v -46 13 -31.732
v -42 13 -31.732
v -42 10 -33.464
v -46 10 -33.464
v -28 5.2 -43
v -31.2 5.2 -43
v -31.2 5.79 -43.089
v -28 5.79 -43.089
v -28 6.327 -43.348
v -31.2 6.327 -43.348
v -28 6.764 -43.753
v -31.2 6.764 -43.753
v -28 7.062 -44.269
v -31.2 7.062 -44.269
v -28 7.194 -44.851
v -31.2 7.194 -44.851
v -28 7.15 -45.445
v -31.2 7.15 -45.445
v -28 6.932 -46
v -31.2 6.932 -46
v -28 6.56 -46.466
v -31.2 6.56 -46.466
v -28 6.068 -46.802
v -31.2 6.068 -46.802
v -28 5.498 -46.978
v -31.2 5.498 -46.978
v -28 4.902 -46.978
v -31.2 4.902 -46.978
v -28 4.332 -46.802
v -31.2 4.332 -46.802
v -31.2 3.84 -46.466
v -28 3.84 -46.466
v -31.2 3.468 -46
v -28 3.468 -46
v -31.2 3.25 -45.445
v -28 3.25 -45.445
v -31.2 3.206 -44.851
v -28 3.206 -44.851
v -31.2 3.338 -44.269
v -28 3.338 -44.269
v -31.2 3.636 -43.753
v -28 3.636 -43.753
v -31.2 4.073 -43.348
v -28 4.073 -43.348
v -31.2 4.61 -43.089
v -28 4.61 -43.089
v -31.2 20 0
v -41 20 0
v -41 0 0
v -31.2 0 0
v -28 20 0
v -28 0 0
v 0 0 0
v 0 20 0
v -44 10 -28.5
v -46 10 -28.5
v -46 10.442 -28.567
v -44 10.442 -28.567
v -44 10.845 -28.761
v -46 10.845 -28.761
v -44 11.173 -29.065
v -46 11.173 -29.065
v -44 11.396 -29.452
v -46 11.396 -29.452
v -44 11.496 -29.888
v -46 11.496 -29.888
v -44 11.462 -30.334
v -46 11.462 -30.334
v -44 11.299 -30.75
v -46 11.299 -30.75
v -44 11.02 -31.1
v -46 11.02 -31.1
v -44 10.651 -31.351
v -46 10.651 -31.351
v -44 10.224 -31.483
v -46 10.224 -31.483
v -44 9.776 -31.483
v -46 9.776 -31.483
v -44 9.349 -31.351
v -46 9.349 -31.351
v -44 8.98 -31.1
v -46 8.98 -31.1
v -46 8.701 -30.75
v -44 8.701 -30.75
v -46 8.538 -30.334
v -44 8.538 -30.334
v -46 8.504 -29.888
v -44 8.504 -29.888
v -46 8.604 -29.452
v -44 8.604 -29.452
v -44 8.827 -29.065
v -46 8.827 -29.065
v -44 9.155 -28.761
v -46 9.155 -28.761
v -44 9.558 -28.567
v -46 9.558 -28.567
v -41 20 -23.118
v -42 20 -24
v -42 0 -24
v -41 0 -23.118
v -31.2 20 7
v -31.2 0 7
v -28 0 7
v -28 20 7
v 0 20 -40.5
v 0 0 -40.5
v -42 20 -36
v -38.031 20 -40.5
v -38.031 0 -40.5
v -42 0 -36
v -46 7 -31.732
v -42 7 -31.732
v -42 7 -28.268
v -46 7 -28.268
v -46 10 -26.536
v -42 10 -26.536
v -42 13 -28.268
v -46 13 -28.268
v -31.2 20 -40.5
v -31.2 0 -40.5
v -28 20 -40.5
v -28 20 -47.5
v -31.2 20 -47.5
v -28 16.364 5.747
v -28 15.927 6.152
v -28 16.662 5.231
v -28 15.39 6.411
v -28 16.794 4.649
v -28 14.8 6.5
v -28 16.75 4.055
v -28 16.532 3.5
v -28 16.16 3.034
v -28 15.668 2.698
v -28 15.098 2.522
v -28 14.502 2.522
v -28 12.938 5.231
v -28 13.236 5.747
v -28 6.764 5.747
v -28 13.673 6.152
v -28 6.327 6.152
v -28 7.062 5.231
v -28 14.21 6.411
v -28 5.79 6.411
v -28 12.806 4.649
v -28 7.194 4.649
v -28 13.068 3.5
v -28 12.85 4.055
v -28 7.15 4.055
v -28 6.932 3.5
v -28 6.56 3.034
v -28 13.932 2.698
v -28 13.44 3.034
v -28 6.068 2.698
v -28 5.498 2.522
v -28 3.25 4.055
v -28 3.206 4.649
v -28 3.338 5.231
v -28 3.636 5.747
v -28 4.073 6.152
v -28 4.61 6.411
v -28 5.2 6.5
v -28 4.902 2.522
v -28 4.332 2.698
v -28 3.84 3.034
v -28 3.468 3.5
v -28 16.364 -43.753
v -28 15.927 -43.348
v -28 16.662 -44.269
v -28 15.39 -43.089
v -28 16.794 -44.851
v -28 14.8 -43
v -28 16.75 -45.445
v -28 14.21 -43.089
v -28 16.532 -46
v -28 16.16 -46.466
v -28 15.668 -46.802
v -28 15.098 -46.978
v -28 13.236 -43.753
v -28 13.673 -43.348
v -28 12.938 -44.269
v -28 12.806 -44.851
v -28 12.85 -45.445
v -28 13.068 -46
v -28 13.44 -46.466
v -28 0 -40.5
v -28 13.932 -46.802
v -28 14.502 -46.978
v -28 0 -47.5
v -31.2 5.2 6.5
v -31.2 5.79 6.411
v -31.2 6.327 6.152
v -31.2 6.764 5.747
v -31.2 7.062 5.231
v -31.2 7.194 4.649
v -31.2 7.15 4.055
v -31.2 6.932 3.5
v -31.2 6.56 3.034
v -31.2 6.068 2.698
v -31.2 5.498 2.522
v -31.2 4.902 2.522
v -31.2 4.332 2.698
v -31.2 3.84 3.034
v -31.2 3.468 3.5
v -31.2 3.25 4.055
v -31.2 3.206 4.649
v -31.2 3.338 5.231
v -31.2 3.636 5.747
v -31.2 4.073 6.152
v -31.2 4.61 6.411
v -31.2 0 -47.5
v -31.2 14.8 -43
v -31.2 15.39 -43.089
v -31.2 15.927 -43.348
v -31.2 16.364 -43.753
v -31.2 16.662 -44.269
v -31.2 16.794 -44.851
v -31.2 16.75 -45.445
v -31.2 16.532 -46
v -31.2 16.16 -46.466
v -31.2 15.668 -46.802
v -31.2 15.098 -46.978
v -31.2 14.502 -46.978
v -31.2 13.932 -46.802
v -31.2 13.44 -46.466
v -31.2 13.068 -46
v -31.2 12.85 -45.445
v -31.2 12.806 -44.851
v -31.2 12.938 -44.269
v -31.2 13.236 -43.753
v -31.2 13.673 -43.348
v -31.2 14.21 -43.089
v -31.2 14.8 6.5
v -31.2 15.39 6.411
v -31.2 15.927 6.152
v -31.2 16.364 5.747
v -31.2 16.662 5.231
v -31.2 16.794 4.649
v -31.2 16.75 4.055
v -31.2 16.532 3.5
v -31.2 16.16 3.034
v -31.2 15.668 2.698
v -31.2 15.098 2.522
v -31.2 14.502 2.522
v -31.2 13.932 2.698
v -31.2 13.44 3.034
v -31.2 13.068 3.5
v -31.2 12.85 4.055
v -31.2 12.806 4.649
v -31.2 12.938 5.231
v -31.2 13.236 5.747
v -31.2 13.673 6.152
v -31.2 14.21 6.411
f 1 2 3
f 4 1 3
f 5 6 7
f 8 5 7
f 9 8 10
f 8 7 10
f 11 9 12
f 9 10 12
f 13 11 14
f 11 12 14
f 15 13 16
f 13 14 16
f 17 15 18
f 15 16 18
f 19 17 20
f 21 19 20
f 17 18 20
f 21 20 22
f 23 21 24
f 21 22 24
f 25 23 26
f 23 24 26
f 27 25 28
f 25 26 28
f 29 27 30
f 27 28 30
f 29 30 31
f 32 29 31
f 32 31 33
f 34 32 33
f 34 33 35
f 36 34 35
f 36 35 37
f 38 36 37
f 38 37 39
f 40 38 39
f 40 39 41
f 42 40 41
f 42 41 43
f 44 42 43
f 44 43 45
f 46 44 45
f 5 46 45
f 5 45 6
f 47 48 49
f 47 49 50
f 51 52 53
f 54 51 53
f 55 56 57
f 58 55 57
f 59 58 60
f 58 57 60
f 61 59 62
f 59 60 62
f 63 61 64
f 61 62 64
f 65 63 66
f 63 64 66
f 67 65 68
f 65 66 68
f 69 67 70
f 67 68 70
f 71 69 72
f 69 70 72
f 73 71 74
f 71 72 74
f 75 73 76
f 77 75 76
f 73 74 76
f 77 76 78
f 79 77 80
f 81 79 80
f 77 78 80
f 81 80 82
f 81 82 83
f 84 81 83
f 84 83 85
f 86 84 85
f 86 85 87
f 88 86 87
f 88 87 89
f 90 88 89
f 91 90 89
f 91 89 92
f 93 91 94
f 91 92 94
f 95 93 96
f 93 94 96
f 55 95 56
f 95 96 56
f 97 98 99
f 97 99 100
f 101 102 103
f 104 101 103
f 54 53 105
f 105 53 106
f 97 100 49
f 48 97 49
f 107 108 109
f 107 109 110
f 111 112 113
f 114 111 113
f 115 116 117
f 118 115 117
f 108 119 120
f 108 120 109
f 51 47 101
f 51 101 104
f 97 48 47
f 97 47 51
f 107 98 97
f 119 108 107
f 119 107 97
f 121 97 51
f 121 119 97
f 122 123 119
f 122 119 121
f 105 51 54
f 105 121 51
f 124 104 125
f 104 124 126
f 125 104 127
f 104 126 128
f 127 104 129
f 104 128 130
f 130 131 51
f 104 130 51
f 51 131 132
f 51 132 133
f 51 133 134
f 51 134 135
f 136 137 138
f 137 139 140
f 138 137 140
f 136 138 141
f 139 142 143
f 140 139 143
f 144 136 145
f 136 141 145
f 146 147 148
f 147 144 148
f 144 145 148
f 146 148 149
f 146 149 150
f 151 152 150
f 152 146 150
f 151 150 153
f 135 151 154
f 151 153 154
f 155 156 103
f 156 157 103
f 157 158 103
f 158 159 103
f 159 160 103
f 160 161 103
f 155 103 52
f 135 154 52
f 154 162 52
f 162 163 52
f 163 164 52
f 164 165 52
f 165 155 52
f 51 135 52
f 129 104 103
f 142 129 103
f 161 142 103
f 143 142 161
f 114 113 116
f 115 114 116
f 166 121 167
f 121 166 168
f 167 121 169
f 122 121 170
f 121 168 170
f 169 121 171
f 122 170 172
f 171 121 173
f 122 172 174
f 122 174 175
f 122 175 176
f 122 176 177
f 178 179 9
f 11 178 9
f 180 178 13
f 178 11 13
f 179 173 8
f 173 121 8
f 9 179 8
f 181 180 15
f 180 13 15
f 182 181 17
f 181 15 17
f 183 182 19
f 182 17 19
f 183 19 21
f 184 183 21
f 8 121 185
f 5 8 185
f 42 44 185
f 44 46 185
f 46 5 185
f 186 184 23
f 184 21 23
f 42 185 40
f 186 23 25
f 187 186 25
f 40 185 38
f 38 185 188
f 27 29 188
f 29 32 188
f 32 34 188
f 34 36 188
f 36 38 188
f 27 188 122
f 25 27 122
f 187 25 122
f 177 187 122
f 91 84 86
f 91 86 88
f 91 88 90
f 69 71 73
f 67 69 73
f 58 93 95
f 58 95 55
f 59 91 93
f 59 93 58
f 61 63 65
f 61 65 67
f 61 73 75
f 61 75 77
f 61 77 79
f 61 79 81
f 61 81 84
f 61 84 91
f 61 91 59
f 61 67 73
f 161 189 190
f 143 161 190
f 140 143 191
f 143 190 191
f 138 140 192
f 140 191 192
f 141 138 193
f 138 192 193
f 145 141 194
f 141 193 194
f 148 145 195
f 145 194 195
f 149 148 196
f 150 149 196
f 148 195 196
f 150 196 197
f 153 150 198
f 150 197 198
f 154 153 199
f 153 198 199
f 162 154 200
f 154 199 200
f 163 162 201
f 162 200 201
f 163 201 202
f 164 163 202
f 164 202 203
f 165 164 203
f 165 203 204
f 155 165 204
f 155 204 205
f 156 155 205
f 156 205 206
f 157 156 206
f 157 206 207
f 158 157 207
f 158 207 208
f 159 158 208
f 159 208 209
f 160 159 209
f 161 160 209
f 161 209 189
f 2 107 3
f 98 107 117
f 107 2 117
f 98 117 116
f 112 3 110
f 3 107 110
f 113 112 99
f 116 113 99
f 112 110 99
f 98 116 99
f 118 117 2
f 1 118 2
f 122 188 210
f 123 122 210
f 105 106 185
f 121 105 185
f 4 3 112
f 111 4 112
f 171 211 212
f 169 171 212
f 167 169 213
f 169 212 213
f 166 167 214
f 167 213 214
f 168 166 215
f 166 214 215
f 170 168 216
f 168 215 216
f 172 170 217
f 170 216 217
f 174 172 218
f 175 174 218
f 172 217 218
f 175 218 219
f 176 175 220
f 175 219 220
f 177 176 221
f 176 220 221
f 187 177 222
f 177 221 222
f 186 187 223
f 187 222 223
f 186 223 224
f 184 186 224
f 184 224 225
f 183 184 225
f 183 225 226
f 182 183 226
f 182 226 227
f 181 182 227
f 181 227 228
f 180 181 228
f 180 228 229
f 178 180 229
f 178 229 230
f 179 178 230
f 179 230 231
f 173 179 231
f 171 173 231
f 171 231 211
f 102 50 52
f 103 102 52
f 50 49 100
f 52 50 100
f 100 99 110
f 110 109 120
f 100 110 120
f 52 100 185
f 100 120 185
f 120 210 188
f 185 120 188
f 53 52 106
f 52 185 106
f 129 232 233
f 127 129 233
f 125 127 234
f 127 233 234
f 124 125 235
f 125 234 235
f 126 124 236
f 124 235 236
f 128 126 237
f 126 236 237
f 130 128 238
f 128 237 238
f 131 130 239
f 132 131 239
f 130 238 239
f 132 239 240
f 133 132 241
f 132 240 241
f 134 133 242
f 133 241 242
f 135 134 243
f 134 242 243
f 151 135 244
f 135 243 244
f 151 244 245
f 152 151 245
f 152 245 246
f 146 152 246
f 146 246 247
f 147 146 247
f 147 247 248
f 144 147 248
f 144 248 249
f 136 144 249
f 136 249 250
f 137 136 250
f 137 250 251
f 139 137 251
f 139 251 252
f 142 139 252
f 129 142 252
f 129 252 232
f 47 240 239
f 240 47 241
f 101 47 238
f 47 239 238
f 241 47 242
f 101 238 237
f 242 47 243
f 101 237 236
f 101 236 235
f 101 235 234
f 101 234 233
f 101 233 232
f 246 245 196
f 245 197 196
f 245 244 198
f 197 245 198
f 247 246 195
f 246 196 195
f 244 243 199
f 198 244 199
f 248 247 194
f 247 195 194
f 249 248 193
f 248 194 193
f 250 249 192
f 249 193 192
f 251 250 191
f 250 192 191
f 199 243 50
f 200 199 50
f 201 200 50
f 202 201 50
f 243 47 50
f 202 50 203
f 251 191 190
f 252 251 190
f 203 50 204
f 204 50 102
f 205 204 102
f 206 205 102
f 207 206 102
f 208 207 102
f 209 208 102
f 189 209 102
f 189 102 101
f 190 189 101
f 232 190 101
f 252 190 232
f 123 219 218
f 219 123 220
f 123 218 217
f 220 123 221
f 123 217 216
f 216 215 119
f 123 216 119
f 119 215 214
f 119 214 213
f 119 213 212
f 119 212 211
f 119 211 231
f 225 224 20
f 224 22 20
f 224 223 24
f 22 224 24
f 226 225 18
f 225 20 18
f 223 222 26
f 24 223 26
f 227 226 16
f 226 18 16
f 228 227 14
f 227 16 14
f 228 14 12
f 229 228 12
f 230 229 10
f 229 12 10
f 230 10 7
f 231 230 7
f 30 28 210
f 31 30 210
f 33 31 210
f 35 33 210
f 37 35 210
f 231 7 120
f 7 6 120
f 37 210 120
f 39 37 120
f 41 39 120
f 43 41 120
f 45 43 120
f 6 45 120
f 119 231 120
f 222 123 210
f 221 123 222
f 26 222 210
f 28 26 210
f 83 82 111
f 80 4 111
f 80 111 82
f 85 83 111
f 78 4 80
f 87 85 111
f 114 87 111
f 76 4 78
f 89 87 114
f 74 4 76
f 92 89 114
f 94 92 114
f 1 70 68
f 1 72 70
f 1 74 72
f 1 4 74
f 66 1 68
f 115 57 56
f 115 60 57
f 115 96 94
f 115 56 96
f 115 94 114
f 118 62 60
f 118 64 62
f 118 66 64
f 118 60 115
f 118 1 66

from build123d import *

# Parameters (mm, degrees)
BOSS_EXTRUDE1_DEPTH = 20
BOSS_EXTRUDE2_DEPTH = 4
SKETCH3_R           = 2
CUT_EXTRUDE1_DEPTH  = 32.2
SKETCH4_R           = 1.5
CUT_EXTRUDE2_DEPTH  = 2


with BuildPart() as part:
    # Sketch1 → Boss-Extrude1 (new body)
    with BuildSketch(Plane(origin=(0, 0, 0), x_dir=(1, 0, 0), z_dir=(0, 1, 0))):
        Polygon((0, 0), (0, 40.5), (-28, 40.5), (-28, 47.5), (-31.2, 47.5), (-31.2, 40.5), (-38.031373033, 40.5), (-42, 36), (-42, 24), (-41, 23.118082896), (-41, 0), (-31.2, 0), (-31.2, -7), (-28, -7), (-28, 0), align=None)
    extrude(amount=BOSS_EXTRUDE1_DEPTH)

    # Sketch2 → Boss-Extrude2 (add)
    with BuildSketch(Plane.ZY.offset(42)):
        Polygon((-33.464101615, 10), (-31.732050808, 7), (-28.267949192, 7), (-26.535898385, 10), (-28.267949192, 13), (-31.732050808, 13), align=None)
    extrude(amount=BOSS_EXTRUDE2_DEPTH)

    # Sketch3 → Cut-Extrude1 (cut, through all)
    with BuildSketch(Plane.ZY.offset(31.2)):
        with Locations((-45, 5.2)):
            Circle(SKETCH3_R)
        with Locations((-45, 14.8)):
            Circle(SKETCH3_R)
        with Locations((4.5, 14.8)):
            Circle(SKETCH3_R)
        with Locations((4.5, 5.2)):
            Circle(SKETCH3_R)
    extrude(amount=-CUT_EXTRUDE1_DEPTH, mode=Mode.SUBTRACT)

    # Sketch4 → Cut-Extrude2 (cut)
    with BuildSketch(Plane.ZY.offset(46)):
        with Locations((-30, 10)):
            Circle(SKETCH4_R)
    extrude(amount=-CUT_EXTRUDE2_DEPTH, mode=Mode.SUBTRACT)


solid = part.part
